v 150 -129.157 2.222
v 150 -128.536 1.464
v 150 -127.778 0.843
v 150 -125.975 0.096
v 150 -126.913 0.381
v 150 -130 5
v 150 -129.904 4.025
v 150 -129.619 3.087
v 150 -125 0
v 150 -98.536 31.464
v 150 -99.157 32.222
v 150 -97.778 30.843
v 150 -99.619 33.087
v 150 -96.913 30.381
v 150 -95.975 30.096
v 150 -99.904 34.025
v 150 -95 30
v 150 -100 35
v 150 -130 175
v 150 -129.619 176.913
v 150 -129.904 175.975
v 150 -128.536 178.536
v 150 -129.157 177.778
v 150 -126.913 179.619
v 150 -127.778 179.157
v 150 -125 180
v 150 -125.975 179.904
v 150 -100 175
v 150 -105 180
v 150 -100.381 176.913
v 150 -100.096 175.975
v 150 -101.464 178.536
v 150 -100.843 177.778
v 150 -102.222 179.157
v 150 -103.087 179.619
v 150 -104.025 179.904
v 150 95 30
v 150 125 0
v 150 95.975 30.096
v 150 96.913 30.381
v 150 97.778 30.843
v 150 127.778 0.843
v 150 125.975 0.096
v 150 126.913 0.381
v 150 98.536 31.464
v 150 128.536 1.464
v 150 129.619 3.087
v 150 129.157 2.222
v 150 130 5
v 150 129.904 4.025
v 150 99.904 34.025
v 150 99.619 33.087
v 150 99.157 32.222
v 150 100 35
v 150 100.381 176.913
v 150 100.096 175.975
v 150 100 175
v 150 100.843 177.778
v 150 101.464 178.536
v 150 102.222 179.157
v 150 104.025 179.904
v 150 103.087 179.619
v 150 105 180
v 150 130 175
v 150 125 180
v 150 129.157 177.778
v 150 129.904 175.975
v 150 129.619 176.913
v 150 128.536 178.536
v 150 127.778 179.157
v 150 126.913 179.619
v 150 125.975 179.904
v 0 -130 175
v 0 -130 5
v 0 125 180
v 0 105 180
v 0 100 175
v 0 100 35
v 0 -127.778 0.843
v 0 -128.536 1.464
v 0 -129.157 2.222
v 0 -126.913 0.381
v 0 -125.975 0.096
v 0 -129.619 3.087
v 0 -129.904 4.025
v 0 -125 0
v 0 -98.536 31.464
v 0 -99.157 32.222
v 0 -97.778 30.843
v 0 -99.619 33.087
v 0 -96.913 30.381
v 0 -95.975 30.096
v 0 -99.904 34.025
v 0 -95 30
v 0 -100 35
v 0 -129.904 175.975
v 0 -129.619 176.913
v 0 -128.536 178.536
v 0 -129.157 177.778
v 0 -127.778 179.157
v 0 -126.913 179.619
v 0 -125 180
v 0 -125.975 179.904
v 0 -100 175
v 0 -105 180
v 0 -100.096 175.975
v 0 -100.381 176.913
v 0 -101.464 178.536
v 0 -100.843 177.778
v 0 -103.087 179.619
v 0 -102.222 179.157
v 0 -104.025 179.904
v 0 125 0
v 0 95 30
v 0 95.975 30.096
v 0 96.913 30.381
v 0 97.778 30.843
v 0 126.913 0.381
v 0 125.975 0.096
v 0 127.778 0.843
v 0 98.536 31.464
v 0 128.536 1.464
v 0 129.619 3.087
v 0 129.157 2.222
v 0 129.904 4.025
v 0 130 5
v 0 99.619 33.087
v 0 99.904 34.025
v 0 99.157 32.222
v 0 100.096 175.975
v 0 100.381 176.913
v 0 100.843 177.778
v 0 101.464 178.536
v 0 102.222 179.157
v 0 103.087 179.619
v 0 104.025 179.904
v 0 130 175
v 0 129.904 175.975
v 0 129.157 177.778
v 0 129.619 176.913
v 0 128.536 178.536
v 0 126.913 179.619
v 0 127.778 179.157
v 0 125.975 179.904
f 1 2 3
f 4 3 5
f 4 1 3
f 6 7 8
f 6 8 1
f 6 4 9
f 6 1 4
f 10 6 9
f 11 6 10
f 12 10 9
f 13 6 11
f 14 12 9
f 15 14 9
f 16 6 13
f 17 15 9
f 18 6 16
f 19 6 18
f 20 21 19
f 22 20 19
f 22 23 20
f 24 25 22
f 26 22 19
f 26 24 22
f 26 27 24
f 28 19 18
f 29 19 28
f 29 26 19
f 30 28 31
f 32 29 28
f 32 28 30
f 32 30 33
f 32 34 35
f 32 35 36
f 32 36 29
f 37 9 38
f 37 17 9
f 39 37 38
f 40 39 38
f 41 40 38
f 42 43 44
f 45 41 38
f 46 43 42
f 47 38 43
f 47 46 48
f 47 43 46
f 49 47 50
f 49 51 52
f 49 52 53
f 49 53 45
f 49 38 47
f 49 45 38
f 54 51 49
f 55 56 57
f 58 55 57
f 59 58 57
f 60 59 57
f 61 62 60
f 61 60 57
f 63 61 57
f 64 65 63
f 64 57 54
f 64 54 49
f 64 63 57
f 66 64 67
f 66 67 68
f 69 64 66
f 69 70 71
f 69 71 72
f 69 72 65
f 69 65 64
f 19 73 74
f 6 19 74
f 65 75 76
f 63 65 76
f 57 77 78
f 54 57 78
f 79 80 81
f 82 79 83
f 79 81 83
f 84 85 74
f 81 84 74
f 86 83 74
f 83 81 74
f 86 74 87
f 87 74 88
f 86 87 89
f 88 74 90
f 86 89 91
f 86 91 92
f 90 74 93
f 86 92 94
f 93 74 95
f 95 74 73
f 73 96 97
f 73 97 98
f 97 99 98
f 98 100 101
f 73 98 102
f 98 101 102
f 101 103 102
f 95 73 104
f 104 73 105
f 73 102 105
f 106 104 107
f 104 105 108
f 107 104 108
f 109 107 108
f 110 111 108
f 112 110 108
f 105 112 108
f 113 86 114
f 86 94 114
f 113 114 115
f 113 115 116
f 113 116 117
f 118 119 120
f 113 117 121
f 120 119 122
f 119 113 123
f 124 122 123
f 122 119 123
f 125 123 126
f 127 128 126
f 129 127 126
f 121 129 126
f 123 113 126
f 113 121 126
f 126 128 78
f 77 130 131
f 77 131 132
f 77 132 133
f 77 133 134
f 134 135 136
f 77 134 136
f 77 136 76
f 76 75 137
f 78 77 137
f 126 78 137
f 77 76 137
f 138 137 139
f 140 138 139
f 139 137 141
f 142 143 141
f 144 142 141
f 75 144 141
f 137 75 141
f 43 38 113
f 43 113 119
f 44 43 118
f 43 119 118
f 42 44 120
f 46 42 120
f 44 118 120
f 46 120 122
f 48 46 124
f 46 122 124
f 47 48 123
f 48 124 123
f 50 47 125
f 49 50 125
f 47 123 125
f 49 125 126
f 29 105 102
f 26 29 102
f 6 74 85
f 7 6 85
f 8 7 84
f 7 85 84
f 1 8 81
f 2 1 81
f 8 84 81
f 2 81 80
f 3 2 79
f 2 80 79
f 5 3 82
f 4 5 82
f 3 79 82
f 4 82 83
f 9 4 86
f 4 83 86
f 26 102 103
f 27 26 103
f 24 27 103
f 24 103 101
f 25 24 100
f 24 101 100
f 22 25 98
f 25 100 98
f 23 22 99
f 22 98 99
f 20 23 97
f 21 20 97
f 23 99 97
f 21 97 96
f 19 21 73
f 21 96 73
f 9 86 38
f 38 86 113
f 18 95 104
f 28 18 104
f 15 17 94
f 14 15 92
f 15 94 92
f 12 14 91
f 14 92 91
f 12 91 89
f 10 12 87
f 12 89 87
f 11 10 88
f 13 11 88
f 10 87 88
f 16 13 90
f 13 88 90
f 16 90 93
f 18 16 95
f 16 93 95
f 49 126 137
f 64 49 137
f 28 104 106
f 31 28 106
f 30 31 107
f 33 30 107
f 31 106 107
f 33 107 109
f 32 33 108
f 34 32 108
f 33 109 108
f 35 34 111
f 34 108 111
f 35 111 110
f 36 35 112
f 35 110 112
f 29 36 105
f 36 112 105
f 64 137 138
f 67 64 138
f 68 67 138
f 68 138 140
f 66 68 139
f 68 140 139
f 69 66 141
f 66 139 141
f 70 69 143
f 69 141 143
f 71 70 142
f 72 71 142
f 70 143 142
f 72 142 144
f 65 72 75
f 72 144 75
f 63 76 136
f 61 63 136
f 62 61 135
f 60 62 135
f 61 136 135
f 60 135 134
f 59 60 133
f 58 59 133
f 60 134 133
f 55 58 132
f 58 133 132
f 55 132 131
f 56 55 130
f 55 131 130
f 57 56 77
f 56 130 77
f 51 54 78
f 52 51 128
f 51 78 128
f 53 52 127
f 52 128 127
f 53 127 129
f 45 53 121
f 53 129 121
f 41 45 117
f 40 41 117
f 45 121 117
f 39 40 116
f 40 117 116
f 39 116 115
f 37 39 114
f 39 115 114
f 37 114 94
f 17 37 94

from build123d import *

# Parameters (mm, degrees)
F1_DEPTH = 150


with BuildPart() as f1:
    # F0 (on Right) → F1 (new body)
    with BuildSketch(Plane.YZ):
        with BuildLine():
            Line((-125, 0), (0, 0))
            Line((0, 0), (125, 0))
            ThreePointArc((125, 0), (128.535534, 1.464466), (130, 5))
            Line((130, 5), (130, 175))
            ThreePointArc((130, 175), (128.535534, 178.535534), (125, 180))
            Line((125, 180), (105, 180))
            ThreePointArc((105, 180), (101.464466, 178.535534), (100, 175))
            Line((100, 175), (100, 35))
            ThreePointArc((100, 35), (98.535534, 31.464466), (95, 30))
            Line((95, 30), (0, 30))
            Line((0, 30), (-95, 30))
            ThreePointArc((-95, 30), (-98.535534, 31.464466), (-100, 35))
            Line((-100, 35), (-100, 175))
            ThreePointArc((-100, 175), (-101.464466, 178.535534), (-105, 180))
            Line((-105, 180), (-125, 180))
            ThreePointArc((-125, 180), (-128.535534, 178.535534), (-130, 175))
            Line((-130, 175), (-130, 5))
            ThreePointArc((-130, 5), (-128.535534, 1.464466), (-125, 0))
        make_face()
    extrude(amount=F1_DEPTH)


solid = f1.part
